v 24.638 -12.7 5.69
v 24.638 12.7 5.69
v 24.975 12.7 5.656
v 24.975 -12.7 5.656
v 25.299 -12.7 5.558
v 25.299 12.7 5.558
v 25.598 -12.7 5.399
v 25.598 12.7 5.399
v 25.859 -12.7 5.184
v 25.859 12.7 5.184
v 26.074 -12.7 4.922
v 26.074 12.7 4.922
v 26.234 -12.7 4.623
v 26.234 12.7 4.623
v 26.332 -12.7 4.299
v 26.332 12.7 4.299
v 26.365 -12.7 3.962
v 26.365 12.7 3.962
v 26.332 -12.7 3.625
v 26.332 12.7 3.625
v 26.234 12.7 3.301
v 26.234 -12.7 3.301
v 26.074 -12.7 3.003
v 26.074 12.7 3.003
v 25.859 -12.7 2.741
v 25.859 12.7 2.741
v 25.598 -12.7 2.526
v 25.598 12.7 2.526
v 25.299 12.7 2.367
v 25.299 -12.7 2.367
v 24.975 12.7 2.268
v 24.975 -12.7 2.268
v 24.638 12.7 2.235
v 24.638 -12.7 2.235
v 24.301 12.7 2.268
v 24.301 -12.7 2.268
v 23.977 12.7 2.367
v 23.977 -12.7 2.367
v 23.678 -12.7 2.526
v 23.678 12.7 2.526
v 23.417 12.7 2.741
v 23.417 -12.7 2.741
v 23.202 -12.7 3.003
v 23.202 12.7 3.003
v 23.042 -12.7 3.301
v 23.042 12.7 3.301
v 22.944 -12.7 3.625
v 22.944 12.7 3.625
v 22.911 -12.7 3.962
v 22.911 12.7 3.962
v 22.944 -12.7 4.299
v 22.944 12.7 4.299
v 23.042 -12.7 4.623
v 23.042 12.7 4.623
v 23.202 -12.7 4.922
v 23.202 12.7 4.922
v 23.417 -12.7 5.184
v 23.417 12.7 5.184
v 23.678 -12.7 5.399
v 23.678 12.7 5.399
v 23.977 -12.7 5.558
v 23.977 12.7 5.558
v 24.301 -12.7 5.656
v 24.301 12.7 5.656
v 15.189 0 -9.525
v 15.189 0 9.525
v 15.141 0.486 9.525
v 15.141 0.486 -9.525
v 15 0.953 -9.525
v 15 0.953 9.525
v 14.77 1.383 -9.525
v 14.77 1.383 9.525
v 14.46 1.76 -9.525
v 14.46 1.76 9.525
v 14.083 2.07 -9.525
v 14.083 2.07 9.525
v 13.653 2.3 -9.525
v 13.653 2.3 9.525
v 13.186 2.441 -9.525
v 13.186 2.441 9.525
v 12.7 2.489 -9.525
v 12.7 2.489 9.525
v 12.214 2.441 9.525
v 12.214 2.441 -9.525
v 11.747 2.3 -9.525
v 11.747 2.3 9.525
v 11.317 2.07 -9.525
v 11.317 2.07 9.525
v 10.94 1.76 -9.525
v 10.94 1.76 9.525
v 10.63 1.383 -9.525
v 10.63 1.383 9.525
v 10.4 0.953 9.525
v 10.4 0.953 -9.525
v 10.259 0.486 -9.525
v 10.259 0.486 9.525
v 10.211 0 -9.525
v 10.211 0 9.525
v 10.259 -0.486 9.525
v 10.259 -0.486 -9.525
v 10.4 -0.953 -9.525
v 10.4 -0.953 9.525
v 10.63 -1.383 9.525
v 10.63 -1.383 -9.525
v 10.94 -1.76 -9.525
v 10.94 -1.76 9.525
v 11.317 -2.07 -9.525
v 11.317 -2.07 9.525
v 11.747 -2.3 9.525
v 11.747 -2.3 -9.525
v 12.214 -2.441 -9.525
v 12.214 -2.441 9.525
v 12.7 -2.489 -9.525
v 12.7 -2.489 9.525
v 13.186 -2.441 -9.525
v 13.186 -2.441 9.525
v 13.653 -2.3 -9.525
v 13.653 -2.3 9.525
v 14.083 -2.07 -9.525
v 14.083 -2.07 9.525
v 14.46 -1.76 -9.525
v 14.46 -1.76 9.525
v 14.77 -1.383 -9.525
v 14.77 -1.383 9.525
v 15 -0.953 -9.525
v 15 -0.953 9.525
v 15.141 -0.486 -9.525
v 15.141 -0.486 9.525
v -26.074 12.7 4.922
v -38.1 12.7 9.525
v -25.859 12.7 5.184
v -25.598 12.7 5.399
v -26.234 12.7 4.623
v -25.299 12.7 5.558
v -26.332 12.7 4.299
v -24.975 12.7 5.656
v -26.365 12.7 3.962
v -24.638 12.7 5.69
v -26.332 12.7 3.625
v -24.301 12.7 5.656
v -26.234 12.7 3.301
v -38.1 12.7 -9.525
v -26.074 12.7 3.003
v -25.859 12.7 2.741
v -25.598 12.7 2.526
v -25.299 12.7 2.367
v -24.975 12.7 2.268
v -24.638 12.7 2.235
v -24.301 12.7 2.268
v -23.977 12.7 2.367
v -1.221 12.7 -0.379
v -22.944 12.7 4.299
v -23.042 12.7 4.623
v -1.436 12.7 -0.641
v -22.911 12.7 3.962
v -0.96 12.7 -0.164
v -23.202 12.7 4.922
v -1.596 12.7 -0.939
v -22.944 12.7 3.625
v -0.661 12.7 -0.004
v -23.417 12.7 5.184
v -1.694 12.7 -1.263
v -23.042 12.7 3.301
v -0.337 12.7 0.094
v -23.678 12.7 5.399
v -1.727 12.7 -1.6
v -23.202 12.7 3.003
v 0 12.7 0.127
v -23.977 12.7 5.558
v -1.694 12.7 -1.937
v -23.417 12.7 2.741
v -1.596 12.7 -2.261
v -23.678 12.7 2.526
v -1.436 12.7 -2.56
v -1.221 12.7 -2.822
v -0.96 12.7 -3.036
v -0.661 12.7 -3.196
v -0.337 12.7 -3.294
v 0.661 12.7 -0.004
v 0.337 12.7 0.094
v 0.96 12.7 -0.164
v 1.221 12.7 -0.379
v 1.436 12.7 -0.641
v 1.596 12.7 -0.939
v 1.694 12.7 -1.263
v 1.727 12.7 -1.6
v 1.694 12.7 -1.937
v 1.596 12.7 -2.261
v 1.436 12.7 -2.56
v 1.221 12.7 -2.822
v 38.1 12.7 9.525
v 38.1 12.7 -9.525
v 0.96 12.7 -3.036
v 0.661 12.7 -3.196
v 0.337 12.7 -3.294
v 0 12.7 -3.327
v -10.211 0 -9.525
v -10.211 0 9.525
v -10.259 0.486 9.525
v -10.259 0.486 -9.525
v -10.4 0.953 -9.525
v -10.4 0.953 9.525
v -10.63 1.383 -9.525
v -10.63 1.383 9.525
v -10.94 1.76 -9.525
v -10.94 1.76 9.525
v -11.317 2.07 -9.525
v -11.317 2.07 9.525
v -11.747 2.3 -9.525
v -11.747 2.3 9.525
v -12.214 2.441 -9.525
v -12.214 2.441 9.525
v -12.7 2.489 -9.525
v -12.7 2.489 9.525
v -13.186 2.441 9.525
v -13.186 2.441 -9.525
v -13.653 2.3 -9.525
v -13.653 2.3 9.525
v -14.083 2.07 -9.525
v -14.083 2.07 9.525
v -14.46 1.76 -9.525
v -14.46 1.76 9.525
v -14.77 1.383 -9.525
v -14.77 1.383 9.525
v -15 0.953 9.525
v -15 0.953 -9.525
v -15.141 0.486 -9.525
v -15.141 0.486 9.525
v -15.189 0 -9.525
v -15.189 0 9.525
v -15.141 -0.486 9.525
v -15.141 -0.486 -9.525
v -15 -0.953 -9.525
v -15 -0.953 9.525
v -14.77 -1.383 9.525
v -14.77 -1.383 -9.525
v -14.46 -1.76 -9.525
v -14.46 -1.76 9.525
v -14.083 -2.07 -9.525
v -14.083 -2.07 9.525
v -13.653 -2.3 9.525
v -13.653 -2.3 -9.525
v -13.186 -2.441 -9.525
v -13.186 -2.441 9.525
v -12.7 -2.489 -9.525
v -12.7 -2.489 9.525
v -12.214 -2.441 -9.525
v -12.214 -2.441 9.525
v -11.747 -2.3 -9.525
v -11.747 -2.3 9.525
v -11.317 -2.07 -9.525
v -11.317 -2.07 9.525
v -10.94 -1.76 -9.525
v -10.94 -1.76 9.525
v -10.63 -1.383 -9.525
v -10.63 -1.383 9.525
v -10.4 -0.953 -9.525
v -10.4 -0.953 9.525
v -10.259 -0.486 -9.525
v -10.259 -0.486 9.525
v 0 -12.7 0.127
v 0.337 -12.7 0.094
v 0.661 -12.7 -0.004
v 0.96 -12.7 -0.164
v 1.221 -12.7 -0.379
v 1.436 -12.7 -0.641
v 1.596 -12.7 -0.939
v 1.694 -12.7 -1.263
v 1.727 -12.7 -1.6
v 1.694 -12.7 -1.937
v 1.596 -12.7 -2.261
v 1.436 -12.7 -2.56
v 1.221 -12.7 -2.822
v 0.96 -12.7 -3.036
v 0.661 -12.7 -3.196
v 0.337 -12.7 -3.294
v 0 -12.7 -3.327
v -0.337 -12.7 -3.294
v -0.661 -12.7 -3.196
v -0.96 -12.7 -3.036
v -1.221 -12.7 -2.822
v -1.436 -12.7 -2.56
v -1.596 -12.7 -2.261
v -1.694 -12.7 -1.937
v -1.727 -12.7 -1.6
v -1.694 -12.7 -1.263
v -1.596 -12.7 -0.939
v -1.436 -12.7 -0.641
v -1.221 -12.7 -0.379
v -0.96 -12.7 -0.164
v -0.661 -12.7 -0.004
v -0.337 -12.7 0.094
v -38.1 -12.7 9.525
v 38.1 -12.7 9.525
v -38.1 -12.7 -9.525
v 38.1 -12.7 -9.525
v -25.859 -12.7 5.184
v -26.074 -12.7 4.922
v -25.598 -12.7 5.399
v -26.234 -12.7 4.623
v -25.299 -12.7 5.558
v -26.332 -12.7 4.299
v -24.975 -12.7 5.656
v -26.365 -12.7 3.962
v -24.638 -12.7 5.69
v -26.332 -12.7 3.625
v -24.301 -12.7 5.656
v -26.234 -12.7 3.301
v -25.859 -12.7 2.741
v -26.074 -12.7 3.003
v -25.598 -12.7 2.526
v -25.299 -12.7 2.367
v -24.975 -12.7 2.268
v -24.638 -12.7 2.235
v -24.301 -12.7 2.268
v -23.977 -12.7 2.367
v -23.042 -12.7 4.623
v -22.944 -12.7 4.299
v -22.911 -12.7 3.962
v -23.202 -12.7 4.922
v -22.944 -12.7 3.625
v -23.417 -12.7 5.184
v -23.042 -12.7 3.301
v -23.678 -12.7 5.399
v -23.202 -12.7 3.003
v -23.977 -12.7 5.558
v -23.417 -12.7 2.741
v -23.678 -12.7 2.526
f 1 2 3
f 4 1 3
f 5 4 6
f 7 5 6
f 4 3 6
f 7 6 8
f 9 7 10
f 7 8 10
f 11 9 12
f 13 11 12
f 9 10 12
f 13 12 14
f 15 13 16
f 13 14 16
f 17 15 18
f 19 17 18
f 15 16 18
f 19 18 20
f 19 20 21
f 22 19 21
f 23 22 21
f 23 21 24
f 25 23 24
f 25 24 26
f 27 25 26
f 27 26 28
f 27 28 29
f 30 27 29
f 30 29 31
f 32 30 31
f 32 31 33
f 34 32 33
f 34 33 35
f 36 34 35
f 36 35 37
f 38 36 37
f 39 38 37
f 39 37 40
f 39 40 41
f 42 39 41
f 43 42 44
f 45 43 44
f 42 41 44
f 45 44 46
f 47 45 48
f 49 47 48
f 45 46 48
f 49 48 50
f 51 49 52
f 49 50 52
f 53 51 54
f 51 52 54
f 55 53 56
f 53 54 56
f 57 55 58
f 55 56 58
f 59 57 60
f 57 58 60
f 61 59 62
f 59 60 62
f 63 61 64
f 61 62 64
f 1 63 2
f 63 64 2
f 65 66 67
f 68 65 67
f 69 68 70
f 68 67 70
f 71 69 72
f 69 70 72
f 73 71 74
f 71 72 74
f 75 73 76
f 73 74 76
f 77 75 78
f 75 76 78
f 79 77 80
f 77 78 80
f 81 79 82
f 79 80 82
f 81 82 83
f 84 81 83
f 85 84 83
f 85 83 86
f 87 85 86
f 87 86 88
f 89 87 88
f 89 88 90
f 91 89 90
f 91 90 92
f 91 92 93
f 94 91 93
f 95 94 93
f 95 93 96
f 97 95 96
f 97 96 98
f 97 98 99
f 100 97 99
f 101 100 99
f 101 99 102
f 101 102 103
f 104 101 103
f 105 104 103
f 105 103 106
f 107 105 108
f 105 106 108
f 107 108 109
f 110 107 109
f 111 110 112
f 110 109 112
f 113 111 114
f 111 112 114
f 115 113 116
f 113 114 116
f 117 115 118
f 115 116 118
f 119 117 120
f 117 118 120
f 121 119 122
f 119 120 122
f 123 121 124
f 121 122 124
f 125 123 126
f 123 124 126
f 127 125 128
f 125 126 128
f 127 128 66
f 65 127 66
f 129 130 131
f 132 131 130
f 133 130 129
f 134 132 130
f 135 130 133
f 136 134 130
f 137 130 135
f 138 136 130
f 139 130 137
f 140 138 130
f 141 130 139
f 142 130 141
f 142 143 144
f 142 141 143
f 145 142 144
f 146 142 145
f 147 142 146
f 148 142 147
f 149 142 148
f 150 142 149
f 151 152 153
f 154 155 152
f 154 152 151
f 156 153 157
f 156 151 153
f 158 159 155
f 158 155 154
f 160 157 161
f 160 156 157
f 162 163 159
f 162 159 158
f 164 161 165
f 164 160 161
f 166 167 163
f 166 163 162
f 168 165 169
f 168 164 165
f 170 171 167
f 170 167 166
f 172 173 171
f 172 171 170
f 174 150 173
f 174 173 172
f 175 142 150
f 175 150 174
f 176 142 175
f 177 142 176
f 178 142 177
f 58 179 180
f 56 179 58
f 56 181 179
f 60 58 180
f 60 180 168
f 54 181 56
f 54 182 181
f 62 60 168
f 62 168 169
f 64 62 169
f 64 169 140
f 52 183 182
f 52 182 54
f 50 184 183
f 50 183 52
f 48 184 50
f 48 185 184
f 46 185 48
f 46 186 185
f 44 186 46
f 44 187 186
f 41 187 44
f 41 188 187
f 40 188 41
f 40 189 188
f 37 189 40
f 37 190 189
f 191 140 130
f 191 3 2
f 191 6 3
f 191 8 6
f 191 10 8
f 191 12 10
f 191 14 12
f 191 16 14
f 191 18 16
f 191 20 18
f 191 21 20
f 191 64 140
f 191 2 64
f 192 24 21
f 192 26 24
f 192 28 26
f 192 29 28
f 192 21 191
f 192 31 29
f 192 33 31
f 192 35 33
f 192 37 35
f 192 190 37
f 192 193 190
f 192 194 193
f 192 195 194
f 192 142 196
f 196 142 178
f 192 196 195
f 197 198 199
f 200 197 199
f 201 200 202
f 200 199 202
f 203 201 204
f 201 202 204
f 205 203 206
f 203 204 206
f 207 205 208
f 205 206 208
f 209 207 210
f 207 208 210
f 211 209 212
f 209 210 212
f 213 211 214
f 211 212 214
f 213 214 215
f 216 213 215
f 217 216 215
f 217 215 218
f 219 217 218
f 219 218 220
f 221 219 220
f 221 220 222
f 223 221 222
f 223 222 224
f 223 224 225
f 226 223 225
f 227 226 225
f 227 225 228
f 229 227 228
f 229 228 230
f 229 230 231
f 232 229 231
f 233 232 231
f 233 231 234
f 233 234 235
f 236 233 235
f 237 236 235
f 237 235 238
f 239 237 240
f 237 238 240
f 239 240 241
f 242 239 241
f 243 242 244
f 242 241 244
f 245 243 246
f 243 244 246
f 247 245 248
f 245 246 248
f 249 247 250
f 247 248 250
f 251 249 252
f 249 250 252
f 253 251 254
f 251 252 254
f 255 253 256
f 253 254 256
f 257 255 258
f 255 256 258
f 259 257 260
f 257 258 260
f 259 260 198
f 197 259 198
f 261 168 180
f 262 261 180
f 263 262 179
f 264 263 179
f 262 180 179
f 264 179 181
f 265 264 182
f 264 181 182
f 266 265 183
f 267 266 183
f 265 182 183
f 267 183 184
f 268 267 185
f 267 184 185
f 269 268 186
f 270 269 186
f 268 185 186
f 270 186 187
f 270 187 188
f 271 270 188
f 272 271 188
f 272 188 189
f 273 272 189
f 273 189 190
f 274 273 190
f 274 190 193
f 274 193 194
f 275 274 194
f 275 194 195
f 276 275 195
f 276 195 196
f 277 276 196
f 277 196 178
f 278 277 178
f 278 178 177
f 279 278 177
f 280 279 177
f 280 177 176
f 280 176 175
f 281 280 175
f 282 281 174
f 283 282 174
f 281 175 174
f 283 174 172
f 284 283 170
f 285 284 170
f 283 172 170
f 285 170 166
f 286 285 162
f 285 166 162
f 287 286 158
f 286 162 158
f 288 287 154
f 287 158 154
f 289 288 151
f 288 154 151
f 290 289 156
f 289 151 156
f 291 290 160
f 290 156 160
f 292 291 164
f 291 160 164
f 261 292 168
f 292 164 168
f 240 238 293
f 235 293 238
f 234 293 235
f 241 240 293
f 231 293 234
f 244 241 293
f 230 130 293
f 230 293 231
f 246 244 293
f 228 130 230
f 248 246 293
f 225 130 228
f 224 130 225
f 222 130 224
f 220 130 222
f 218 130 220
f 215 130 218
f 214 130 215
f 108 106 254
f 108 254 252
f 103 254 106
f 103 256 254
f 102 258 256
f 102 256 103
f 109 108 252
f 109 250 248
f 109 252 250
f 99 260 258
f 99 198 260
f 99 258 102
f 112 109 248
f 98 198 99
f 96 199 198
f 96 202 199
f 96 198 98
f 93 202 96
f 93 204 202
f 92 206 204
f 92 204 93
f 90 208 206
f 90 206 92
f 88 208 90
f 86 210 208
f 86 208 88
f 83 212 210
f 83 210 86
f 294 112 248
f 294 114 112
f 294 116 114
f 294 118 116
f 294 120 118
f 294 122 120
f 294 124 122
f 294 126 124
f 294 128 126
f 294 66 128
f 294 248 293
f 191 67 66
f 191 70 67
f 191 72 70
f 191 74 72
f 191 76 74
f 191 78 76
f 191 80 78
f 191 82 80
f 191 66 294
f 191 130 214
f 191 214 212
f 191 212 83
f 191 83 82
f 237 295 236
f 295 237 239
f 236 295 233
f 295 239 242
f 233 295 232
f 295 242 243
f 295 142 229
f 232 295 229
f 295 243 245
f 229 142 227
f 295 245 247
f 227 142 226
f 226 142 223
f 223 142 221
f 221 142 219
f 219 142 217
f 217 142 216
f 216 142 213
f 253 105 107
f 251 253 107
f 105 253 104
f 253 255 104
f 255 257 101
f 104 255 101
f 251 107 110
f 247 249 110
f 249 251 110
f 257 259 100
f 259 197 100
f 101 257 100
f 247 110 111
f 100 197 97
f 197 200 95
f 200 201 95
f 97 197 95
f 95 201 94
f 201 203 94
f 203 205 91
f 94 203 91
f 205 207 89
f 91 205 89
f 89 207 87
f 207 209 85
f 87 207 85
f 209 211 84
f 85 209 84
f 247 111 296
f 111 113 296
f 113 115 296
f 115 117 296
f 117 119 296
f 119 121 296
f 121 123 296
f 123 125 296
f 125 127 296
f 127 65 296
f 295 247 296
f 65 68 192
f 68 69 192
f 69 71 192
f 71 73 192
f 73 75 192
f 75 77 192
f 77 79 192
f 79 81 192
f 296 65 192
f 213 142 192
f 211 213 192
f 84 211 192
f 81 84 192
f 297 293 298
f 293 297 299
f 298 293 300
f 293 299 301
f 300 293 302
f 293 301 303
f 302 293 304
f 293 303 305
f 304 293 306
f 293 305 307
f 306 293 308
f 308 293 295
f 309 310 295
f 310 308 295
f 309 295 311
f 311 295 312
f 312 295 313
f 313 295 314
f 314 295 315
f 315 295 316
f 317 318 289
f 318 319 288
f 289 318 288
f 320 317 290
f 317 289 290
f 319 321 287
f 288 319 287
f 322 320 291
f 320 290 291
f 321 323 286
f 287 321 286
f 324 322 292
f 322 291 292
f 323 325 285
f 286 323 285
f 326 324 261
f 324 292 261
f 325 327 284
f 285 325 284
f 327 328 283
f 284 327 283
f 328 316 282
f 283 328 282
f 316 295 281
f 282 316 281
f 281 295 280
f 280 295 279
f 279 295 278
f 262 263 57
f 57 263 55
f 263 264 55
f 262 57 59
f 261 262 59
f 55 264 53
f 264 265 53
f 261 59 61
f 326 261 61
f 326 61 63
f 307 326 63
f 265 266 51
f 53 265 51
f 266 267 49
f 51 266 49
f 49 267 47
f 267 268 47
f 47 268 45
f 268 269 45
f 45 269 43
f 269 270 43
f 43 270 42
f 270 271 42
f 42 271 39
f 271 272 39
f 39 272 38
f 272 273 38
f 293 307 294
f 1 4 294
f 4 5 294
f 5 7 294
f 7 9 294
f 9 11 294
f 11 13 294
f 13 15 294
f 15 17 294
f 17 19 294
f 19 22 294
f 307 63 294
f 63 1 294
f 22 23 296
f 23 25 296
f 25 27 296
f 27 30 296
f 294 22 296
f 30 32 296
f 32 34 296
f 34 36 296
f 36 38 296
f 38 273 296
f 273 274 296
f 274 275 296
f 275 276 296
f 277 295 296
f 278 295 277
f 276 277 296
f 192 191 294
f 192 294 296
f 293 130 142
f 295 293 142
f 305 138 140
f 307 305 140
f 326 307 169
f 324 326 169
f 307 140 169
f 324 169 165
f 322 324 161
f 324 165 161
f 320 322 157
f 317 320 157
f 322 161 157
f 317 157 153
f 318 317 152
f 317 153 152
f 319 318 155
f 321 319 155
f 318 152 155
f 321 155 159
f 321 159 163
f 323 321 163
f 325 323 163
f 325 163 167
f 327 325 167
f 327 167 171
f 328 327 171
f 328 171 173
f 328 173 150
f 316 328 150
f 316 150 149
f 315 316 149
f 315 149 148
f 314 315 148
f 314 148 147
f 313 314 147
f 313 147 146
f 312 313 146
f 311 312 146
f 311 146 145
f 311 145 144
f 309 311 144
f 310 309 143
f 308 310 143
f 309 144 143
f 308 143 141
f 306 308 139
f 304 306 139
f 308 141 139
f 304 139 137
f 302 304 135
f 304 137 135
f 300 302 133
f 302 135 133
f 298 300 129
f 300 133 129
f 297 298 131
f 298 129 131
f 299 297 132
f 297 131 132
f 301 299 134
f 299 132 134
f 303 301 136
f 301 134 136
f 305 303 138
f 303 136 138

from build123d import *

# Parameters (mm, degrees)
SKETCH1_W              = 76.2
SKETCH1_H              = 19.05
BOSS_EXTRUDE1_DEPTH    = 12.7
F_8_32_TAPPED_HOLE1_D  = 3.4544
F_10_CLEARANCE_HOLE1_D = 4.9784


with BuildPart() as part:
    # Sketch1 → Boss-Extrude1 (new, symmetric)
    with BuildSketch(Plane(origin=(0, 0, 0), x_dir=(1, 0, 0), z_dir=(0, 1, 0))):
        Rectangle(SKETCH1_W, SKETCH1_H)
    extrude(amount=BOSS_EXTRUDE1_DEPTH, both=True)

    # #8-32 Tapped Hole1 (through all)
    with Locations(Plane(origin=(-24.638, -12.7, 3.9624), x_dir=(0, 0, -1), z_dir=(0, -1, 0))):
        with Locations((0, 0), (5.5626, 24.638), (0, 49.276)):
            Hole(F_8_32_TAPPED_HOLE1_D / 2)

    # #10 Clearance Hole1 (through all)
    with Locations(Plane(origin=(0, 0, -9.525), x_dir=(-1, 0, 0), z_dir=(0, 0, -1))):
        with Locations((-12.7, 0), (12.7, 0)):
            Hole(F_10_CLEARANCE_HOLE1_D / 2)


solid = part.part
